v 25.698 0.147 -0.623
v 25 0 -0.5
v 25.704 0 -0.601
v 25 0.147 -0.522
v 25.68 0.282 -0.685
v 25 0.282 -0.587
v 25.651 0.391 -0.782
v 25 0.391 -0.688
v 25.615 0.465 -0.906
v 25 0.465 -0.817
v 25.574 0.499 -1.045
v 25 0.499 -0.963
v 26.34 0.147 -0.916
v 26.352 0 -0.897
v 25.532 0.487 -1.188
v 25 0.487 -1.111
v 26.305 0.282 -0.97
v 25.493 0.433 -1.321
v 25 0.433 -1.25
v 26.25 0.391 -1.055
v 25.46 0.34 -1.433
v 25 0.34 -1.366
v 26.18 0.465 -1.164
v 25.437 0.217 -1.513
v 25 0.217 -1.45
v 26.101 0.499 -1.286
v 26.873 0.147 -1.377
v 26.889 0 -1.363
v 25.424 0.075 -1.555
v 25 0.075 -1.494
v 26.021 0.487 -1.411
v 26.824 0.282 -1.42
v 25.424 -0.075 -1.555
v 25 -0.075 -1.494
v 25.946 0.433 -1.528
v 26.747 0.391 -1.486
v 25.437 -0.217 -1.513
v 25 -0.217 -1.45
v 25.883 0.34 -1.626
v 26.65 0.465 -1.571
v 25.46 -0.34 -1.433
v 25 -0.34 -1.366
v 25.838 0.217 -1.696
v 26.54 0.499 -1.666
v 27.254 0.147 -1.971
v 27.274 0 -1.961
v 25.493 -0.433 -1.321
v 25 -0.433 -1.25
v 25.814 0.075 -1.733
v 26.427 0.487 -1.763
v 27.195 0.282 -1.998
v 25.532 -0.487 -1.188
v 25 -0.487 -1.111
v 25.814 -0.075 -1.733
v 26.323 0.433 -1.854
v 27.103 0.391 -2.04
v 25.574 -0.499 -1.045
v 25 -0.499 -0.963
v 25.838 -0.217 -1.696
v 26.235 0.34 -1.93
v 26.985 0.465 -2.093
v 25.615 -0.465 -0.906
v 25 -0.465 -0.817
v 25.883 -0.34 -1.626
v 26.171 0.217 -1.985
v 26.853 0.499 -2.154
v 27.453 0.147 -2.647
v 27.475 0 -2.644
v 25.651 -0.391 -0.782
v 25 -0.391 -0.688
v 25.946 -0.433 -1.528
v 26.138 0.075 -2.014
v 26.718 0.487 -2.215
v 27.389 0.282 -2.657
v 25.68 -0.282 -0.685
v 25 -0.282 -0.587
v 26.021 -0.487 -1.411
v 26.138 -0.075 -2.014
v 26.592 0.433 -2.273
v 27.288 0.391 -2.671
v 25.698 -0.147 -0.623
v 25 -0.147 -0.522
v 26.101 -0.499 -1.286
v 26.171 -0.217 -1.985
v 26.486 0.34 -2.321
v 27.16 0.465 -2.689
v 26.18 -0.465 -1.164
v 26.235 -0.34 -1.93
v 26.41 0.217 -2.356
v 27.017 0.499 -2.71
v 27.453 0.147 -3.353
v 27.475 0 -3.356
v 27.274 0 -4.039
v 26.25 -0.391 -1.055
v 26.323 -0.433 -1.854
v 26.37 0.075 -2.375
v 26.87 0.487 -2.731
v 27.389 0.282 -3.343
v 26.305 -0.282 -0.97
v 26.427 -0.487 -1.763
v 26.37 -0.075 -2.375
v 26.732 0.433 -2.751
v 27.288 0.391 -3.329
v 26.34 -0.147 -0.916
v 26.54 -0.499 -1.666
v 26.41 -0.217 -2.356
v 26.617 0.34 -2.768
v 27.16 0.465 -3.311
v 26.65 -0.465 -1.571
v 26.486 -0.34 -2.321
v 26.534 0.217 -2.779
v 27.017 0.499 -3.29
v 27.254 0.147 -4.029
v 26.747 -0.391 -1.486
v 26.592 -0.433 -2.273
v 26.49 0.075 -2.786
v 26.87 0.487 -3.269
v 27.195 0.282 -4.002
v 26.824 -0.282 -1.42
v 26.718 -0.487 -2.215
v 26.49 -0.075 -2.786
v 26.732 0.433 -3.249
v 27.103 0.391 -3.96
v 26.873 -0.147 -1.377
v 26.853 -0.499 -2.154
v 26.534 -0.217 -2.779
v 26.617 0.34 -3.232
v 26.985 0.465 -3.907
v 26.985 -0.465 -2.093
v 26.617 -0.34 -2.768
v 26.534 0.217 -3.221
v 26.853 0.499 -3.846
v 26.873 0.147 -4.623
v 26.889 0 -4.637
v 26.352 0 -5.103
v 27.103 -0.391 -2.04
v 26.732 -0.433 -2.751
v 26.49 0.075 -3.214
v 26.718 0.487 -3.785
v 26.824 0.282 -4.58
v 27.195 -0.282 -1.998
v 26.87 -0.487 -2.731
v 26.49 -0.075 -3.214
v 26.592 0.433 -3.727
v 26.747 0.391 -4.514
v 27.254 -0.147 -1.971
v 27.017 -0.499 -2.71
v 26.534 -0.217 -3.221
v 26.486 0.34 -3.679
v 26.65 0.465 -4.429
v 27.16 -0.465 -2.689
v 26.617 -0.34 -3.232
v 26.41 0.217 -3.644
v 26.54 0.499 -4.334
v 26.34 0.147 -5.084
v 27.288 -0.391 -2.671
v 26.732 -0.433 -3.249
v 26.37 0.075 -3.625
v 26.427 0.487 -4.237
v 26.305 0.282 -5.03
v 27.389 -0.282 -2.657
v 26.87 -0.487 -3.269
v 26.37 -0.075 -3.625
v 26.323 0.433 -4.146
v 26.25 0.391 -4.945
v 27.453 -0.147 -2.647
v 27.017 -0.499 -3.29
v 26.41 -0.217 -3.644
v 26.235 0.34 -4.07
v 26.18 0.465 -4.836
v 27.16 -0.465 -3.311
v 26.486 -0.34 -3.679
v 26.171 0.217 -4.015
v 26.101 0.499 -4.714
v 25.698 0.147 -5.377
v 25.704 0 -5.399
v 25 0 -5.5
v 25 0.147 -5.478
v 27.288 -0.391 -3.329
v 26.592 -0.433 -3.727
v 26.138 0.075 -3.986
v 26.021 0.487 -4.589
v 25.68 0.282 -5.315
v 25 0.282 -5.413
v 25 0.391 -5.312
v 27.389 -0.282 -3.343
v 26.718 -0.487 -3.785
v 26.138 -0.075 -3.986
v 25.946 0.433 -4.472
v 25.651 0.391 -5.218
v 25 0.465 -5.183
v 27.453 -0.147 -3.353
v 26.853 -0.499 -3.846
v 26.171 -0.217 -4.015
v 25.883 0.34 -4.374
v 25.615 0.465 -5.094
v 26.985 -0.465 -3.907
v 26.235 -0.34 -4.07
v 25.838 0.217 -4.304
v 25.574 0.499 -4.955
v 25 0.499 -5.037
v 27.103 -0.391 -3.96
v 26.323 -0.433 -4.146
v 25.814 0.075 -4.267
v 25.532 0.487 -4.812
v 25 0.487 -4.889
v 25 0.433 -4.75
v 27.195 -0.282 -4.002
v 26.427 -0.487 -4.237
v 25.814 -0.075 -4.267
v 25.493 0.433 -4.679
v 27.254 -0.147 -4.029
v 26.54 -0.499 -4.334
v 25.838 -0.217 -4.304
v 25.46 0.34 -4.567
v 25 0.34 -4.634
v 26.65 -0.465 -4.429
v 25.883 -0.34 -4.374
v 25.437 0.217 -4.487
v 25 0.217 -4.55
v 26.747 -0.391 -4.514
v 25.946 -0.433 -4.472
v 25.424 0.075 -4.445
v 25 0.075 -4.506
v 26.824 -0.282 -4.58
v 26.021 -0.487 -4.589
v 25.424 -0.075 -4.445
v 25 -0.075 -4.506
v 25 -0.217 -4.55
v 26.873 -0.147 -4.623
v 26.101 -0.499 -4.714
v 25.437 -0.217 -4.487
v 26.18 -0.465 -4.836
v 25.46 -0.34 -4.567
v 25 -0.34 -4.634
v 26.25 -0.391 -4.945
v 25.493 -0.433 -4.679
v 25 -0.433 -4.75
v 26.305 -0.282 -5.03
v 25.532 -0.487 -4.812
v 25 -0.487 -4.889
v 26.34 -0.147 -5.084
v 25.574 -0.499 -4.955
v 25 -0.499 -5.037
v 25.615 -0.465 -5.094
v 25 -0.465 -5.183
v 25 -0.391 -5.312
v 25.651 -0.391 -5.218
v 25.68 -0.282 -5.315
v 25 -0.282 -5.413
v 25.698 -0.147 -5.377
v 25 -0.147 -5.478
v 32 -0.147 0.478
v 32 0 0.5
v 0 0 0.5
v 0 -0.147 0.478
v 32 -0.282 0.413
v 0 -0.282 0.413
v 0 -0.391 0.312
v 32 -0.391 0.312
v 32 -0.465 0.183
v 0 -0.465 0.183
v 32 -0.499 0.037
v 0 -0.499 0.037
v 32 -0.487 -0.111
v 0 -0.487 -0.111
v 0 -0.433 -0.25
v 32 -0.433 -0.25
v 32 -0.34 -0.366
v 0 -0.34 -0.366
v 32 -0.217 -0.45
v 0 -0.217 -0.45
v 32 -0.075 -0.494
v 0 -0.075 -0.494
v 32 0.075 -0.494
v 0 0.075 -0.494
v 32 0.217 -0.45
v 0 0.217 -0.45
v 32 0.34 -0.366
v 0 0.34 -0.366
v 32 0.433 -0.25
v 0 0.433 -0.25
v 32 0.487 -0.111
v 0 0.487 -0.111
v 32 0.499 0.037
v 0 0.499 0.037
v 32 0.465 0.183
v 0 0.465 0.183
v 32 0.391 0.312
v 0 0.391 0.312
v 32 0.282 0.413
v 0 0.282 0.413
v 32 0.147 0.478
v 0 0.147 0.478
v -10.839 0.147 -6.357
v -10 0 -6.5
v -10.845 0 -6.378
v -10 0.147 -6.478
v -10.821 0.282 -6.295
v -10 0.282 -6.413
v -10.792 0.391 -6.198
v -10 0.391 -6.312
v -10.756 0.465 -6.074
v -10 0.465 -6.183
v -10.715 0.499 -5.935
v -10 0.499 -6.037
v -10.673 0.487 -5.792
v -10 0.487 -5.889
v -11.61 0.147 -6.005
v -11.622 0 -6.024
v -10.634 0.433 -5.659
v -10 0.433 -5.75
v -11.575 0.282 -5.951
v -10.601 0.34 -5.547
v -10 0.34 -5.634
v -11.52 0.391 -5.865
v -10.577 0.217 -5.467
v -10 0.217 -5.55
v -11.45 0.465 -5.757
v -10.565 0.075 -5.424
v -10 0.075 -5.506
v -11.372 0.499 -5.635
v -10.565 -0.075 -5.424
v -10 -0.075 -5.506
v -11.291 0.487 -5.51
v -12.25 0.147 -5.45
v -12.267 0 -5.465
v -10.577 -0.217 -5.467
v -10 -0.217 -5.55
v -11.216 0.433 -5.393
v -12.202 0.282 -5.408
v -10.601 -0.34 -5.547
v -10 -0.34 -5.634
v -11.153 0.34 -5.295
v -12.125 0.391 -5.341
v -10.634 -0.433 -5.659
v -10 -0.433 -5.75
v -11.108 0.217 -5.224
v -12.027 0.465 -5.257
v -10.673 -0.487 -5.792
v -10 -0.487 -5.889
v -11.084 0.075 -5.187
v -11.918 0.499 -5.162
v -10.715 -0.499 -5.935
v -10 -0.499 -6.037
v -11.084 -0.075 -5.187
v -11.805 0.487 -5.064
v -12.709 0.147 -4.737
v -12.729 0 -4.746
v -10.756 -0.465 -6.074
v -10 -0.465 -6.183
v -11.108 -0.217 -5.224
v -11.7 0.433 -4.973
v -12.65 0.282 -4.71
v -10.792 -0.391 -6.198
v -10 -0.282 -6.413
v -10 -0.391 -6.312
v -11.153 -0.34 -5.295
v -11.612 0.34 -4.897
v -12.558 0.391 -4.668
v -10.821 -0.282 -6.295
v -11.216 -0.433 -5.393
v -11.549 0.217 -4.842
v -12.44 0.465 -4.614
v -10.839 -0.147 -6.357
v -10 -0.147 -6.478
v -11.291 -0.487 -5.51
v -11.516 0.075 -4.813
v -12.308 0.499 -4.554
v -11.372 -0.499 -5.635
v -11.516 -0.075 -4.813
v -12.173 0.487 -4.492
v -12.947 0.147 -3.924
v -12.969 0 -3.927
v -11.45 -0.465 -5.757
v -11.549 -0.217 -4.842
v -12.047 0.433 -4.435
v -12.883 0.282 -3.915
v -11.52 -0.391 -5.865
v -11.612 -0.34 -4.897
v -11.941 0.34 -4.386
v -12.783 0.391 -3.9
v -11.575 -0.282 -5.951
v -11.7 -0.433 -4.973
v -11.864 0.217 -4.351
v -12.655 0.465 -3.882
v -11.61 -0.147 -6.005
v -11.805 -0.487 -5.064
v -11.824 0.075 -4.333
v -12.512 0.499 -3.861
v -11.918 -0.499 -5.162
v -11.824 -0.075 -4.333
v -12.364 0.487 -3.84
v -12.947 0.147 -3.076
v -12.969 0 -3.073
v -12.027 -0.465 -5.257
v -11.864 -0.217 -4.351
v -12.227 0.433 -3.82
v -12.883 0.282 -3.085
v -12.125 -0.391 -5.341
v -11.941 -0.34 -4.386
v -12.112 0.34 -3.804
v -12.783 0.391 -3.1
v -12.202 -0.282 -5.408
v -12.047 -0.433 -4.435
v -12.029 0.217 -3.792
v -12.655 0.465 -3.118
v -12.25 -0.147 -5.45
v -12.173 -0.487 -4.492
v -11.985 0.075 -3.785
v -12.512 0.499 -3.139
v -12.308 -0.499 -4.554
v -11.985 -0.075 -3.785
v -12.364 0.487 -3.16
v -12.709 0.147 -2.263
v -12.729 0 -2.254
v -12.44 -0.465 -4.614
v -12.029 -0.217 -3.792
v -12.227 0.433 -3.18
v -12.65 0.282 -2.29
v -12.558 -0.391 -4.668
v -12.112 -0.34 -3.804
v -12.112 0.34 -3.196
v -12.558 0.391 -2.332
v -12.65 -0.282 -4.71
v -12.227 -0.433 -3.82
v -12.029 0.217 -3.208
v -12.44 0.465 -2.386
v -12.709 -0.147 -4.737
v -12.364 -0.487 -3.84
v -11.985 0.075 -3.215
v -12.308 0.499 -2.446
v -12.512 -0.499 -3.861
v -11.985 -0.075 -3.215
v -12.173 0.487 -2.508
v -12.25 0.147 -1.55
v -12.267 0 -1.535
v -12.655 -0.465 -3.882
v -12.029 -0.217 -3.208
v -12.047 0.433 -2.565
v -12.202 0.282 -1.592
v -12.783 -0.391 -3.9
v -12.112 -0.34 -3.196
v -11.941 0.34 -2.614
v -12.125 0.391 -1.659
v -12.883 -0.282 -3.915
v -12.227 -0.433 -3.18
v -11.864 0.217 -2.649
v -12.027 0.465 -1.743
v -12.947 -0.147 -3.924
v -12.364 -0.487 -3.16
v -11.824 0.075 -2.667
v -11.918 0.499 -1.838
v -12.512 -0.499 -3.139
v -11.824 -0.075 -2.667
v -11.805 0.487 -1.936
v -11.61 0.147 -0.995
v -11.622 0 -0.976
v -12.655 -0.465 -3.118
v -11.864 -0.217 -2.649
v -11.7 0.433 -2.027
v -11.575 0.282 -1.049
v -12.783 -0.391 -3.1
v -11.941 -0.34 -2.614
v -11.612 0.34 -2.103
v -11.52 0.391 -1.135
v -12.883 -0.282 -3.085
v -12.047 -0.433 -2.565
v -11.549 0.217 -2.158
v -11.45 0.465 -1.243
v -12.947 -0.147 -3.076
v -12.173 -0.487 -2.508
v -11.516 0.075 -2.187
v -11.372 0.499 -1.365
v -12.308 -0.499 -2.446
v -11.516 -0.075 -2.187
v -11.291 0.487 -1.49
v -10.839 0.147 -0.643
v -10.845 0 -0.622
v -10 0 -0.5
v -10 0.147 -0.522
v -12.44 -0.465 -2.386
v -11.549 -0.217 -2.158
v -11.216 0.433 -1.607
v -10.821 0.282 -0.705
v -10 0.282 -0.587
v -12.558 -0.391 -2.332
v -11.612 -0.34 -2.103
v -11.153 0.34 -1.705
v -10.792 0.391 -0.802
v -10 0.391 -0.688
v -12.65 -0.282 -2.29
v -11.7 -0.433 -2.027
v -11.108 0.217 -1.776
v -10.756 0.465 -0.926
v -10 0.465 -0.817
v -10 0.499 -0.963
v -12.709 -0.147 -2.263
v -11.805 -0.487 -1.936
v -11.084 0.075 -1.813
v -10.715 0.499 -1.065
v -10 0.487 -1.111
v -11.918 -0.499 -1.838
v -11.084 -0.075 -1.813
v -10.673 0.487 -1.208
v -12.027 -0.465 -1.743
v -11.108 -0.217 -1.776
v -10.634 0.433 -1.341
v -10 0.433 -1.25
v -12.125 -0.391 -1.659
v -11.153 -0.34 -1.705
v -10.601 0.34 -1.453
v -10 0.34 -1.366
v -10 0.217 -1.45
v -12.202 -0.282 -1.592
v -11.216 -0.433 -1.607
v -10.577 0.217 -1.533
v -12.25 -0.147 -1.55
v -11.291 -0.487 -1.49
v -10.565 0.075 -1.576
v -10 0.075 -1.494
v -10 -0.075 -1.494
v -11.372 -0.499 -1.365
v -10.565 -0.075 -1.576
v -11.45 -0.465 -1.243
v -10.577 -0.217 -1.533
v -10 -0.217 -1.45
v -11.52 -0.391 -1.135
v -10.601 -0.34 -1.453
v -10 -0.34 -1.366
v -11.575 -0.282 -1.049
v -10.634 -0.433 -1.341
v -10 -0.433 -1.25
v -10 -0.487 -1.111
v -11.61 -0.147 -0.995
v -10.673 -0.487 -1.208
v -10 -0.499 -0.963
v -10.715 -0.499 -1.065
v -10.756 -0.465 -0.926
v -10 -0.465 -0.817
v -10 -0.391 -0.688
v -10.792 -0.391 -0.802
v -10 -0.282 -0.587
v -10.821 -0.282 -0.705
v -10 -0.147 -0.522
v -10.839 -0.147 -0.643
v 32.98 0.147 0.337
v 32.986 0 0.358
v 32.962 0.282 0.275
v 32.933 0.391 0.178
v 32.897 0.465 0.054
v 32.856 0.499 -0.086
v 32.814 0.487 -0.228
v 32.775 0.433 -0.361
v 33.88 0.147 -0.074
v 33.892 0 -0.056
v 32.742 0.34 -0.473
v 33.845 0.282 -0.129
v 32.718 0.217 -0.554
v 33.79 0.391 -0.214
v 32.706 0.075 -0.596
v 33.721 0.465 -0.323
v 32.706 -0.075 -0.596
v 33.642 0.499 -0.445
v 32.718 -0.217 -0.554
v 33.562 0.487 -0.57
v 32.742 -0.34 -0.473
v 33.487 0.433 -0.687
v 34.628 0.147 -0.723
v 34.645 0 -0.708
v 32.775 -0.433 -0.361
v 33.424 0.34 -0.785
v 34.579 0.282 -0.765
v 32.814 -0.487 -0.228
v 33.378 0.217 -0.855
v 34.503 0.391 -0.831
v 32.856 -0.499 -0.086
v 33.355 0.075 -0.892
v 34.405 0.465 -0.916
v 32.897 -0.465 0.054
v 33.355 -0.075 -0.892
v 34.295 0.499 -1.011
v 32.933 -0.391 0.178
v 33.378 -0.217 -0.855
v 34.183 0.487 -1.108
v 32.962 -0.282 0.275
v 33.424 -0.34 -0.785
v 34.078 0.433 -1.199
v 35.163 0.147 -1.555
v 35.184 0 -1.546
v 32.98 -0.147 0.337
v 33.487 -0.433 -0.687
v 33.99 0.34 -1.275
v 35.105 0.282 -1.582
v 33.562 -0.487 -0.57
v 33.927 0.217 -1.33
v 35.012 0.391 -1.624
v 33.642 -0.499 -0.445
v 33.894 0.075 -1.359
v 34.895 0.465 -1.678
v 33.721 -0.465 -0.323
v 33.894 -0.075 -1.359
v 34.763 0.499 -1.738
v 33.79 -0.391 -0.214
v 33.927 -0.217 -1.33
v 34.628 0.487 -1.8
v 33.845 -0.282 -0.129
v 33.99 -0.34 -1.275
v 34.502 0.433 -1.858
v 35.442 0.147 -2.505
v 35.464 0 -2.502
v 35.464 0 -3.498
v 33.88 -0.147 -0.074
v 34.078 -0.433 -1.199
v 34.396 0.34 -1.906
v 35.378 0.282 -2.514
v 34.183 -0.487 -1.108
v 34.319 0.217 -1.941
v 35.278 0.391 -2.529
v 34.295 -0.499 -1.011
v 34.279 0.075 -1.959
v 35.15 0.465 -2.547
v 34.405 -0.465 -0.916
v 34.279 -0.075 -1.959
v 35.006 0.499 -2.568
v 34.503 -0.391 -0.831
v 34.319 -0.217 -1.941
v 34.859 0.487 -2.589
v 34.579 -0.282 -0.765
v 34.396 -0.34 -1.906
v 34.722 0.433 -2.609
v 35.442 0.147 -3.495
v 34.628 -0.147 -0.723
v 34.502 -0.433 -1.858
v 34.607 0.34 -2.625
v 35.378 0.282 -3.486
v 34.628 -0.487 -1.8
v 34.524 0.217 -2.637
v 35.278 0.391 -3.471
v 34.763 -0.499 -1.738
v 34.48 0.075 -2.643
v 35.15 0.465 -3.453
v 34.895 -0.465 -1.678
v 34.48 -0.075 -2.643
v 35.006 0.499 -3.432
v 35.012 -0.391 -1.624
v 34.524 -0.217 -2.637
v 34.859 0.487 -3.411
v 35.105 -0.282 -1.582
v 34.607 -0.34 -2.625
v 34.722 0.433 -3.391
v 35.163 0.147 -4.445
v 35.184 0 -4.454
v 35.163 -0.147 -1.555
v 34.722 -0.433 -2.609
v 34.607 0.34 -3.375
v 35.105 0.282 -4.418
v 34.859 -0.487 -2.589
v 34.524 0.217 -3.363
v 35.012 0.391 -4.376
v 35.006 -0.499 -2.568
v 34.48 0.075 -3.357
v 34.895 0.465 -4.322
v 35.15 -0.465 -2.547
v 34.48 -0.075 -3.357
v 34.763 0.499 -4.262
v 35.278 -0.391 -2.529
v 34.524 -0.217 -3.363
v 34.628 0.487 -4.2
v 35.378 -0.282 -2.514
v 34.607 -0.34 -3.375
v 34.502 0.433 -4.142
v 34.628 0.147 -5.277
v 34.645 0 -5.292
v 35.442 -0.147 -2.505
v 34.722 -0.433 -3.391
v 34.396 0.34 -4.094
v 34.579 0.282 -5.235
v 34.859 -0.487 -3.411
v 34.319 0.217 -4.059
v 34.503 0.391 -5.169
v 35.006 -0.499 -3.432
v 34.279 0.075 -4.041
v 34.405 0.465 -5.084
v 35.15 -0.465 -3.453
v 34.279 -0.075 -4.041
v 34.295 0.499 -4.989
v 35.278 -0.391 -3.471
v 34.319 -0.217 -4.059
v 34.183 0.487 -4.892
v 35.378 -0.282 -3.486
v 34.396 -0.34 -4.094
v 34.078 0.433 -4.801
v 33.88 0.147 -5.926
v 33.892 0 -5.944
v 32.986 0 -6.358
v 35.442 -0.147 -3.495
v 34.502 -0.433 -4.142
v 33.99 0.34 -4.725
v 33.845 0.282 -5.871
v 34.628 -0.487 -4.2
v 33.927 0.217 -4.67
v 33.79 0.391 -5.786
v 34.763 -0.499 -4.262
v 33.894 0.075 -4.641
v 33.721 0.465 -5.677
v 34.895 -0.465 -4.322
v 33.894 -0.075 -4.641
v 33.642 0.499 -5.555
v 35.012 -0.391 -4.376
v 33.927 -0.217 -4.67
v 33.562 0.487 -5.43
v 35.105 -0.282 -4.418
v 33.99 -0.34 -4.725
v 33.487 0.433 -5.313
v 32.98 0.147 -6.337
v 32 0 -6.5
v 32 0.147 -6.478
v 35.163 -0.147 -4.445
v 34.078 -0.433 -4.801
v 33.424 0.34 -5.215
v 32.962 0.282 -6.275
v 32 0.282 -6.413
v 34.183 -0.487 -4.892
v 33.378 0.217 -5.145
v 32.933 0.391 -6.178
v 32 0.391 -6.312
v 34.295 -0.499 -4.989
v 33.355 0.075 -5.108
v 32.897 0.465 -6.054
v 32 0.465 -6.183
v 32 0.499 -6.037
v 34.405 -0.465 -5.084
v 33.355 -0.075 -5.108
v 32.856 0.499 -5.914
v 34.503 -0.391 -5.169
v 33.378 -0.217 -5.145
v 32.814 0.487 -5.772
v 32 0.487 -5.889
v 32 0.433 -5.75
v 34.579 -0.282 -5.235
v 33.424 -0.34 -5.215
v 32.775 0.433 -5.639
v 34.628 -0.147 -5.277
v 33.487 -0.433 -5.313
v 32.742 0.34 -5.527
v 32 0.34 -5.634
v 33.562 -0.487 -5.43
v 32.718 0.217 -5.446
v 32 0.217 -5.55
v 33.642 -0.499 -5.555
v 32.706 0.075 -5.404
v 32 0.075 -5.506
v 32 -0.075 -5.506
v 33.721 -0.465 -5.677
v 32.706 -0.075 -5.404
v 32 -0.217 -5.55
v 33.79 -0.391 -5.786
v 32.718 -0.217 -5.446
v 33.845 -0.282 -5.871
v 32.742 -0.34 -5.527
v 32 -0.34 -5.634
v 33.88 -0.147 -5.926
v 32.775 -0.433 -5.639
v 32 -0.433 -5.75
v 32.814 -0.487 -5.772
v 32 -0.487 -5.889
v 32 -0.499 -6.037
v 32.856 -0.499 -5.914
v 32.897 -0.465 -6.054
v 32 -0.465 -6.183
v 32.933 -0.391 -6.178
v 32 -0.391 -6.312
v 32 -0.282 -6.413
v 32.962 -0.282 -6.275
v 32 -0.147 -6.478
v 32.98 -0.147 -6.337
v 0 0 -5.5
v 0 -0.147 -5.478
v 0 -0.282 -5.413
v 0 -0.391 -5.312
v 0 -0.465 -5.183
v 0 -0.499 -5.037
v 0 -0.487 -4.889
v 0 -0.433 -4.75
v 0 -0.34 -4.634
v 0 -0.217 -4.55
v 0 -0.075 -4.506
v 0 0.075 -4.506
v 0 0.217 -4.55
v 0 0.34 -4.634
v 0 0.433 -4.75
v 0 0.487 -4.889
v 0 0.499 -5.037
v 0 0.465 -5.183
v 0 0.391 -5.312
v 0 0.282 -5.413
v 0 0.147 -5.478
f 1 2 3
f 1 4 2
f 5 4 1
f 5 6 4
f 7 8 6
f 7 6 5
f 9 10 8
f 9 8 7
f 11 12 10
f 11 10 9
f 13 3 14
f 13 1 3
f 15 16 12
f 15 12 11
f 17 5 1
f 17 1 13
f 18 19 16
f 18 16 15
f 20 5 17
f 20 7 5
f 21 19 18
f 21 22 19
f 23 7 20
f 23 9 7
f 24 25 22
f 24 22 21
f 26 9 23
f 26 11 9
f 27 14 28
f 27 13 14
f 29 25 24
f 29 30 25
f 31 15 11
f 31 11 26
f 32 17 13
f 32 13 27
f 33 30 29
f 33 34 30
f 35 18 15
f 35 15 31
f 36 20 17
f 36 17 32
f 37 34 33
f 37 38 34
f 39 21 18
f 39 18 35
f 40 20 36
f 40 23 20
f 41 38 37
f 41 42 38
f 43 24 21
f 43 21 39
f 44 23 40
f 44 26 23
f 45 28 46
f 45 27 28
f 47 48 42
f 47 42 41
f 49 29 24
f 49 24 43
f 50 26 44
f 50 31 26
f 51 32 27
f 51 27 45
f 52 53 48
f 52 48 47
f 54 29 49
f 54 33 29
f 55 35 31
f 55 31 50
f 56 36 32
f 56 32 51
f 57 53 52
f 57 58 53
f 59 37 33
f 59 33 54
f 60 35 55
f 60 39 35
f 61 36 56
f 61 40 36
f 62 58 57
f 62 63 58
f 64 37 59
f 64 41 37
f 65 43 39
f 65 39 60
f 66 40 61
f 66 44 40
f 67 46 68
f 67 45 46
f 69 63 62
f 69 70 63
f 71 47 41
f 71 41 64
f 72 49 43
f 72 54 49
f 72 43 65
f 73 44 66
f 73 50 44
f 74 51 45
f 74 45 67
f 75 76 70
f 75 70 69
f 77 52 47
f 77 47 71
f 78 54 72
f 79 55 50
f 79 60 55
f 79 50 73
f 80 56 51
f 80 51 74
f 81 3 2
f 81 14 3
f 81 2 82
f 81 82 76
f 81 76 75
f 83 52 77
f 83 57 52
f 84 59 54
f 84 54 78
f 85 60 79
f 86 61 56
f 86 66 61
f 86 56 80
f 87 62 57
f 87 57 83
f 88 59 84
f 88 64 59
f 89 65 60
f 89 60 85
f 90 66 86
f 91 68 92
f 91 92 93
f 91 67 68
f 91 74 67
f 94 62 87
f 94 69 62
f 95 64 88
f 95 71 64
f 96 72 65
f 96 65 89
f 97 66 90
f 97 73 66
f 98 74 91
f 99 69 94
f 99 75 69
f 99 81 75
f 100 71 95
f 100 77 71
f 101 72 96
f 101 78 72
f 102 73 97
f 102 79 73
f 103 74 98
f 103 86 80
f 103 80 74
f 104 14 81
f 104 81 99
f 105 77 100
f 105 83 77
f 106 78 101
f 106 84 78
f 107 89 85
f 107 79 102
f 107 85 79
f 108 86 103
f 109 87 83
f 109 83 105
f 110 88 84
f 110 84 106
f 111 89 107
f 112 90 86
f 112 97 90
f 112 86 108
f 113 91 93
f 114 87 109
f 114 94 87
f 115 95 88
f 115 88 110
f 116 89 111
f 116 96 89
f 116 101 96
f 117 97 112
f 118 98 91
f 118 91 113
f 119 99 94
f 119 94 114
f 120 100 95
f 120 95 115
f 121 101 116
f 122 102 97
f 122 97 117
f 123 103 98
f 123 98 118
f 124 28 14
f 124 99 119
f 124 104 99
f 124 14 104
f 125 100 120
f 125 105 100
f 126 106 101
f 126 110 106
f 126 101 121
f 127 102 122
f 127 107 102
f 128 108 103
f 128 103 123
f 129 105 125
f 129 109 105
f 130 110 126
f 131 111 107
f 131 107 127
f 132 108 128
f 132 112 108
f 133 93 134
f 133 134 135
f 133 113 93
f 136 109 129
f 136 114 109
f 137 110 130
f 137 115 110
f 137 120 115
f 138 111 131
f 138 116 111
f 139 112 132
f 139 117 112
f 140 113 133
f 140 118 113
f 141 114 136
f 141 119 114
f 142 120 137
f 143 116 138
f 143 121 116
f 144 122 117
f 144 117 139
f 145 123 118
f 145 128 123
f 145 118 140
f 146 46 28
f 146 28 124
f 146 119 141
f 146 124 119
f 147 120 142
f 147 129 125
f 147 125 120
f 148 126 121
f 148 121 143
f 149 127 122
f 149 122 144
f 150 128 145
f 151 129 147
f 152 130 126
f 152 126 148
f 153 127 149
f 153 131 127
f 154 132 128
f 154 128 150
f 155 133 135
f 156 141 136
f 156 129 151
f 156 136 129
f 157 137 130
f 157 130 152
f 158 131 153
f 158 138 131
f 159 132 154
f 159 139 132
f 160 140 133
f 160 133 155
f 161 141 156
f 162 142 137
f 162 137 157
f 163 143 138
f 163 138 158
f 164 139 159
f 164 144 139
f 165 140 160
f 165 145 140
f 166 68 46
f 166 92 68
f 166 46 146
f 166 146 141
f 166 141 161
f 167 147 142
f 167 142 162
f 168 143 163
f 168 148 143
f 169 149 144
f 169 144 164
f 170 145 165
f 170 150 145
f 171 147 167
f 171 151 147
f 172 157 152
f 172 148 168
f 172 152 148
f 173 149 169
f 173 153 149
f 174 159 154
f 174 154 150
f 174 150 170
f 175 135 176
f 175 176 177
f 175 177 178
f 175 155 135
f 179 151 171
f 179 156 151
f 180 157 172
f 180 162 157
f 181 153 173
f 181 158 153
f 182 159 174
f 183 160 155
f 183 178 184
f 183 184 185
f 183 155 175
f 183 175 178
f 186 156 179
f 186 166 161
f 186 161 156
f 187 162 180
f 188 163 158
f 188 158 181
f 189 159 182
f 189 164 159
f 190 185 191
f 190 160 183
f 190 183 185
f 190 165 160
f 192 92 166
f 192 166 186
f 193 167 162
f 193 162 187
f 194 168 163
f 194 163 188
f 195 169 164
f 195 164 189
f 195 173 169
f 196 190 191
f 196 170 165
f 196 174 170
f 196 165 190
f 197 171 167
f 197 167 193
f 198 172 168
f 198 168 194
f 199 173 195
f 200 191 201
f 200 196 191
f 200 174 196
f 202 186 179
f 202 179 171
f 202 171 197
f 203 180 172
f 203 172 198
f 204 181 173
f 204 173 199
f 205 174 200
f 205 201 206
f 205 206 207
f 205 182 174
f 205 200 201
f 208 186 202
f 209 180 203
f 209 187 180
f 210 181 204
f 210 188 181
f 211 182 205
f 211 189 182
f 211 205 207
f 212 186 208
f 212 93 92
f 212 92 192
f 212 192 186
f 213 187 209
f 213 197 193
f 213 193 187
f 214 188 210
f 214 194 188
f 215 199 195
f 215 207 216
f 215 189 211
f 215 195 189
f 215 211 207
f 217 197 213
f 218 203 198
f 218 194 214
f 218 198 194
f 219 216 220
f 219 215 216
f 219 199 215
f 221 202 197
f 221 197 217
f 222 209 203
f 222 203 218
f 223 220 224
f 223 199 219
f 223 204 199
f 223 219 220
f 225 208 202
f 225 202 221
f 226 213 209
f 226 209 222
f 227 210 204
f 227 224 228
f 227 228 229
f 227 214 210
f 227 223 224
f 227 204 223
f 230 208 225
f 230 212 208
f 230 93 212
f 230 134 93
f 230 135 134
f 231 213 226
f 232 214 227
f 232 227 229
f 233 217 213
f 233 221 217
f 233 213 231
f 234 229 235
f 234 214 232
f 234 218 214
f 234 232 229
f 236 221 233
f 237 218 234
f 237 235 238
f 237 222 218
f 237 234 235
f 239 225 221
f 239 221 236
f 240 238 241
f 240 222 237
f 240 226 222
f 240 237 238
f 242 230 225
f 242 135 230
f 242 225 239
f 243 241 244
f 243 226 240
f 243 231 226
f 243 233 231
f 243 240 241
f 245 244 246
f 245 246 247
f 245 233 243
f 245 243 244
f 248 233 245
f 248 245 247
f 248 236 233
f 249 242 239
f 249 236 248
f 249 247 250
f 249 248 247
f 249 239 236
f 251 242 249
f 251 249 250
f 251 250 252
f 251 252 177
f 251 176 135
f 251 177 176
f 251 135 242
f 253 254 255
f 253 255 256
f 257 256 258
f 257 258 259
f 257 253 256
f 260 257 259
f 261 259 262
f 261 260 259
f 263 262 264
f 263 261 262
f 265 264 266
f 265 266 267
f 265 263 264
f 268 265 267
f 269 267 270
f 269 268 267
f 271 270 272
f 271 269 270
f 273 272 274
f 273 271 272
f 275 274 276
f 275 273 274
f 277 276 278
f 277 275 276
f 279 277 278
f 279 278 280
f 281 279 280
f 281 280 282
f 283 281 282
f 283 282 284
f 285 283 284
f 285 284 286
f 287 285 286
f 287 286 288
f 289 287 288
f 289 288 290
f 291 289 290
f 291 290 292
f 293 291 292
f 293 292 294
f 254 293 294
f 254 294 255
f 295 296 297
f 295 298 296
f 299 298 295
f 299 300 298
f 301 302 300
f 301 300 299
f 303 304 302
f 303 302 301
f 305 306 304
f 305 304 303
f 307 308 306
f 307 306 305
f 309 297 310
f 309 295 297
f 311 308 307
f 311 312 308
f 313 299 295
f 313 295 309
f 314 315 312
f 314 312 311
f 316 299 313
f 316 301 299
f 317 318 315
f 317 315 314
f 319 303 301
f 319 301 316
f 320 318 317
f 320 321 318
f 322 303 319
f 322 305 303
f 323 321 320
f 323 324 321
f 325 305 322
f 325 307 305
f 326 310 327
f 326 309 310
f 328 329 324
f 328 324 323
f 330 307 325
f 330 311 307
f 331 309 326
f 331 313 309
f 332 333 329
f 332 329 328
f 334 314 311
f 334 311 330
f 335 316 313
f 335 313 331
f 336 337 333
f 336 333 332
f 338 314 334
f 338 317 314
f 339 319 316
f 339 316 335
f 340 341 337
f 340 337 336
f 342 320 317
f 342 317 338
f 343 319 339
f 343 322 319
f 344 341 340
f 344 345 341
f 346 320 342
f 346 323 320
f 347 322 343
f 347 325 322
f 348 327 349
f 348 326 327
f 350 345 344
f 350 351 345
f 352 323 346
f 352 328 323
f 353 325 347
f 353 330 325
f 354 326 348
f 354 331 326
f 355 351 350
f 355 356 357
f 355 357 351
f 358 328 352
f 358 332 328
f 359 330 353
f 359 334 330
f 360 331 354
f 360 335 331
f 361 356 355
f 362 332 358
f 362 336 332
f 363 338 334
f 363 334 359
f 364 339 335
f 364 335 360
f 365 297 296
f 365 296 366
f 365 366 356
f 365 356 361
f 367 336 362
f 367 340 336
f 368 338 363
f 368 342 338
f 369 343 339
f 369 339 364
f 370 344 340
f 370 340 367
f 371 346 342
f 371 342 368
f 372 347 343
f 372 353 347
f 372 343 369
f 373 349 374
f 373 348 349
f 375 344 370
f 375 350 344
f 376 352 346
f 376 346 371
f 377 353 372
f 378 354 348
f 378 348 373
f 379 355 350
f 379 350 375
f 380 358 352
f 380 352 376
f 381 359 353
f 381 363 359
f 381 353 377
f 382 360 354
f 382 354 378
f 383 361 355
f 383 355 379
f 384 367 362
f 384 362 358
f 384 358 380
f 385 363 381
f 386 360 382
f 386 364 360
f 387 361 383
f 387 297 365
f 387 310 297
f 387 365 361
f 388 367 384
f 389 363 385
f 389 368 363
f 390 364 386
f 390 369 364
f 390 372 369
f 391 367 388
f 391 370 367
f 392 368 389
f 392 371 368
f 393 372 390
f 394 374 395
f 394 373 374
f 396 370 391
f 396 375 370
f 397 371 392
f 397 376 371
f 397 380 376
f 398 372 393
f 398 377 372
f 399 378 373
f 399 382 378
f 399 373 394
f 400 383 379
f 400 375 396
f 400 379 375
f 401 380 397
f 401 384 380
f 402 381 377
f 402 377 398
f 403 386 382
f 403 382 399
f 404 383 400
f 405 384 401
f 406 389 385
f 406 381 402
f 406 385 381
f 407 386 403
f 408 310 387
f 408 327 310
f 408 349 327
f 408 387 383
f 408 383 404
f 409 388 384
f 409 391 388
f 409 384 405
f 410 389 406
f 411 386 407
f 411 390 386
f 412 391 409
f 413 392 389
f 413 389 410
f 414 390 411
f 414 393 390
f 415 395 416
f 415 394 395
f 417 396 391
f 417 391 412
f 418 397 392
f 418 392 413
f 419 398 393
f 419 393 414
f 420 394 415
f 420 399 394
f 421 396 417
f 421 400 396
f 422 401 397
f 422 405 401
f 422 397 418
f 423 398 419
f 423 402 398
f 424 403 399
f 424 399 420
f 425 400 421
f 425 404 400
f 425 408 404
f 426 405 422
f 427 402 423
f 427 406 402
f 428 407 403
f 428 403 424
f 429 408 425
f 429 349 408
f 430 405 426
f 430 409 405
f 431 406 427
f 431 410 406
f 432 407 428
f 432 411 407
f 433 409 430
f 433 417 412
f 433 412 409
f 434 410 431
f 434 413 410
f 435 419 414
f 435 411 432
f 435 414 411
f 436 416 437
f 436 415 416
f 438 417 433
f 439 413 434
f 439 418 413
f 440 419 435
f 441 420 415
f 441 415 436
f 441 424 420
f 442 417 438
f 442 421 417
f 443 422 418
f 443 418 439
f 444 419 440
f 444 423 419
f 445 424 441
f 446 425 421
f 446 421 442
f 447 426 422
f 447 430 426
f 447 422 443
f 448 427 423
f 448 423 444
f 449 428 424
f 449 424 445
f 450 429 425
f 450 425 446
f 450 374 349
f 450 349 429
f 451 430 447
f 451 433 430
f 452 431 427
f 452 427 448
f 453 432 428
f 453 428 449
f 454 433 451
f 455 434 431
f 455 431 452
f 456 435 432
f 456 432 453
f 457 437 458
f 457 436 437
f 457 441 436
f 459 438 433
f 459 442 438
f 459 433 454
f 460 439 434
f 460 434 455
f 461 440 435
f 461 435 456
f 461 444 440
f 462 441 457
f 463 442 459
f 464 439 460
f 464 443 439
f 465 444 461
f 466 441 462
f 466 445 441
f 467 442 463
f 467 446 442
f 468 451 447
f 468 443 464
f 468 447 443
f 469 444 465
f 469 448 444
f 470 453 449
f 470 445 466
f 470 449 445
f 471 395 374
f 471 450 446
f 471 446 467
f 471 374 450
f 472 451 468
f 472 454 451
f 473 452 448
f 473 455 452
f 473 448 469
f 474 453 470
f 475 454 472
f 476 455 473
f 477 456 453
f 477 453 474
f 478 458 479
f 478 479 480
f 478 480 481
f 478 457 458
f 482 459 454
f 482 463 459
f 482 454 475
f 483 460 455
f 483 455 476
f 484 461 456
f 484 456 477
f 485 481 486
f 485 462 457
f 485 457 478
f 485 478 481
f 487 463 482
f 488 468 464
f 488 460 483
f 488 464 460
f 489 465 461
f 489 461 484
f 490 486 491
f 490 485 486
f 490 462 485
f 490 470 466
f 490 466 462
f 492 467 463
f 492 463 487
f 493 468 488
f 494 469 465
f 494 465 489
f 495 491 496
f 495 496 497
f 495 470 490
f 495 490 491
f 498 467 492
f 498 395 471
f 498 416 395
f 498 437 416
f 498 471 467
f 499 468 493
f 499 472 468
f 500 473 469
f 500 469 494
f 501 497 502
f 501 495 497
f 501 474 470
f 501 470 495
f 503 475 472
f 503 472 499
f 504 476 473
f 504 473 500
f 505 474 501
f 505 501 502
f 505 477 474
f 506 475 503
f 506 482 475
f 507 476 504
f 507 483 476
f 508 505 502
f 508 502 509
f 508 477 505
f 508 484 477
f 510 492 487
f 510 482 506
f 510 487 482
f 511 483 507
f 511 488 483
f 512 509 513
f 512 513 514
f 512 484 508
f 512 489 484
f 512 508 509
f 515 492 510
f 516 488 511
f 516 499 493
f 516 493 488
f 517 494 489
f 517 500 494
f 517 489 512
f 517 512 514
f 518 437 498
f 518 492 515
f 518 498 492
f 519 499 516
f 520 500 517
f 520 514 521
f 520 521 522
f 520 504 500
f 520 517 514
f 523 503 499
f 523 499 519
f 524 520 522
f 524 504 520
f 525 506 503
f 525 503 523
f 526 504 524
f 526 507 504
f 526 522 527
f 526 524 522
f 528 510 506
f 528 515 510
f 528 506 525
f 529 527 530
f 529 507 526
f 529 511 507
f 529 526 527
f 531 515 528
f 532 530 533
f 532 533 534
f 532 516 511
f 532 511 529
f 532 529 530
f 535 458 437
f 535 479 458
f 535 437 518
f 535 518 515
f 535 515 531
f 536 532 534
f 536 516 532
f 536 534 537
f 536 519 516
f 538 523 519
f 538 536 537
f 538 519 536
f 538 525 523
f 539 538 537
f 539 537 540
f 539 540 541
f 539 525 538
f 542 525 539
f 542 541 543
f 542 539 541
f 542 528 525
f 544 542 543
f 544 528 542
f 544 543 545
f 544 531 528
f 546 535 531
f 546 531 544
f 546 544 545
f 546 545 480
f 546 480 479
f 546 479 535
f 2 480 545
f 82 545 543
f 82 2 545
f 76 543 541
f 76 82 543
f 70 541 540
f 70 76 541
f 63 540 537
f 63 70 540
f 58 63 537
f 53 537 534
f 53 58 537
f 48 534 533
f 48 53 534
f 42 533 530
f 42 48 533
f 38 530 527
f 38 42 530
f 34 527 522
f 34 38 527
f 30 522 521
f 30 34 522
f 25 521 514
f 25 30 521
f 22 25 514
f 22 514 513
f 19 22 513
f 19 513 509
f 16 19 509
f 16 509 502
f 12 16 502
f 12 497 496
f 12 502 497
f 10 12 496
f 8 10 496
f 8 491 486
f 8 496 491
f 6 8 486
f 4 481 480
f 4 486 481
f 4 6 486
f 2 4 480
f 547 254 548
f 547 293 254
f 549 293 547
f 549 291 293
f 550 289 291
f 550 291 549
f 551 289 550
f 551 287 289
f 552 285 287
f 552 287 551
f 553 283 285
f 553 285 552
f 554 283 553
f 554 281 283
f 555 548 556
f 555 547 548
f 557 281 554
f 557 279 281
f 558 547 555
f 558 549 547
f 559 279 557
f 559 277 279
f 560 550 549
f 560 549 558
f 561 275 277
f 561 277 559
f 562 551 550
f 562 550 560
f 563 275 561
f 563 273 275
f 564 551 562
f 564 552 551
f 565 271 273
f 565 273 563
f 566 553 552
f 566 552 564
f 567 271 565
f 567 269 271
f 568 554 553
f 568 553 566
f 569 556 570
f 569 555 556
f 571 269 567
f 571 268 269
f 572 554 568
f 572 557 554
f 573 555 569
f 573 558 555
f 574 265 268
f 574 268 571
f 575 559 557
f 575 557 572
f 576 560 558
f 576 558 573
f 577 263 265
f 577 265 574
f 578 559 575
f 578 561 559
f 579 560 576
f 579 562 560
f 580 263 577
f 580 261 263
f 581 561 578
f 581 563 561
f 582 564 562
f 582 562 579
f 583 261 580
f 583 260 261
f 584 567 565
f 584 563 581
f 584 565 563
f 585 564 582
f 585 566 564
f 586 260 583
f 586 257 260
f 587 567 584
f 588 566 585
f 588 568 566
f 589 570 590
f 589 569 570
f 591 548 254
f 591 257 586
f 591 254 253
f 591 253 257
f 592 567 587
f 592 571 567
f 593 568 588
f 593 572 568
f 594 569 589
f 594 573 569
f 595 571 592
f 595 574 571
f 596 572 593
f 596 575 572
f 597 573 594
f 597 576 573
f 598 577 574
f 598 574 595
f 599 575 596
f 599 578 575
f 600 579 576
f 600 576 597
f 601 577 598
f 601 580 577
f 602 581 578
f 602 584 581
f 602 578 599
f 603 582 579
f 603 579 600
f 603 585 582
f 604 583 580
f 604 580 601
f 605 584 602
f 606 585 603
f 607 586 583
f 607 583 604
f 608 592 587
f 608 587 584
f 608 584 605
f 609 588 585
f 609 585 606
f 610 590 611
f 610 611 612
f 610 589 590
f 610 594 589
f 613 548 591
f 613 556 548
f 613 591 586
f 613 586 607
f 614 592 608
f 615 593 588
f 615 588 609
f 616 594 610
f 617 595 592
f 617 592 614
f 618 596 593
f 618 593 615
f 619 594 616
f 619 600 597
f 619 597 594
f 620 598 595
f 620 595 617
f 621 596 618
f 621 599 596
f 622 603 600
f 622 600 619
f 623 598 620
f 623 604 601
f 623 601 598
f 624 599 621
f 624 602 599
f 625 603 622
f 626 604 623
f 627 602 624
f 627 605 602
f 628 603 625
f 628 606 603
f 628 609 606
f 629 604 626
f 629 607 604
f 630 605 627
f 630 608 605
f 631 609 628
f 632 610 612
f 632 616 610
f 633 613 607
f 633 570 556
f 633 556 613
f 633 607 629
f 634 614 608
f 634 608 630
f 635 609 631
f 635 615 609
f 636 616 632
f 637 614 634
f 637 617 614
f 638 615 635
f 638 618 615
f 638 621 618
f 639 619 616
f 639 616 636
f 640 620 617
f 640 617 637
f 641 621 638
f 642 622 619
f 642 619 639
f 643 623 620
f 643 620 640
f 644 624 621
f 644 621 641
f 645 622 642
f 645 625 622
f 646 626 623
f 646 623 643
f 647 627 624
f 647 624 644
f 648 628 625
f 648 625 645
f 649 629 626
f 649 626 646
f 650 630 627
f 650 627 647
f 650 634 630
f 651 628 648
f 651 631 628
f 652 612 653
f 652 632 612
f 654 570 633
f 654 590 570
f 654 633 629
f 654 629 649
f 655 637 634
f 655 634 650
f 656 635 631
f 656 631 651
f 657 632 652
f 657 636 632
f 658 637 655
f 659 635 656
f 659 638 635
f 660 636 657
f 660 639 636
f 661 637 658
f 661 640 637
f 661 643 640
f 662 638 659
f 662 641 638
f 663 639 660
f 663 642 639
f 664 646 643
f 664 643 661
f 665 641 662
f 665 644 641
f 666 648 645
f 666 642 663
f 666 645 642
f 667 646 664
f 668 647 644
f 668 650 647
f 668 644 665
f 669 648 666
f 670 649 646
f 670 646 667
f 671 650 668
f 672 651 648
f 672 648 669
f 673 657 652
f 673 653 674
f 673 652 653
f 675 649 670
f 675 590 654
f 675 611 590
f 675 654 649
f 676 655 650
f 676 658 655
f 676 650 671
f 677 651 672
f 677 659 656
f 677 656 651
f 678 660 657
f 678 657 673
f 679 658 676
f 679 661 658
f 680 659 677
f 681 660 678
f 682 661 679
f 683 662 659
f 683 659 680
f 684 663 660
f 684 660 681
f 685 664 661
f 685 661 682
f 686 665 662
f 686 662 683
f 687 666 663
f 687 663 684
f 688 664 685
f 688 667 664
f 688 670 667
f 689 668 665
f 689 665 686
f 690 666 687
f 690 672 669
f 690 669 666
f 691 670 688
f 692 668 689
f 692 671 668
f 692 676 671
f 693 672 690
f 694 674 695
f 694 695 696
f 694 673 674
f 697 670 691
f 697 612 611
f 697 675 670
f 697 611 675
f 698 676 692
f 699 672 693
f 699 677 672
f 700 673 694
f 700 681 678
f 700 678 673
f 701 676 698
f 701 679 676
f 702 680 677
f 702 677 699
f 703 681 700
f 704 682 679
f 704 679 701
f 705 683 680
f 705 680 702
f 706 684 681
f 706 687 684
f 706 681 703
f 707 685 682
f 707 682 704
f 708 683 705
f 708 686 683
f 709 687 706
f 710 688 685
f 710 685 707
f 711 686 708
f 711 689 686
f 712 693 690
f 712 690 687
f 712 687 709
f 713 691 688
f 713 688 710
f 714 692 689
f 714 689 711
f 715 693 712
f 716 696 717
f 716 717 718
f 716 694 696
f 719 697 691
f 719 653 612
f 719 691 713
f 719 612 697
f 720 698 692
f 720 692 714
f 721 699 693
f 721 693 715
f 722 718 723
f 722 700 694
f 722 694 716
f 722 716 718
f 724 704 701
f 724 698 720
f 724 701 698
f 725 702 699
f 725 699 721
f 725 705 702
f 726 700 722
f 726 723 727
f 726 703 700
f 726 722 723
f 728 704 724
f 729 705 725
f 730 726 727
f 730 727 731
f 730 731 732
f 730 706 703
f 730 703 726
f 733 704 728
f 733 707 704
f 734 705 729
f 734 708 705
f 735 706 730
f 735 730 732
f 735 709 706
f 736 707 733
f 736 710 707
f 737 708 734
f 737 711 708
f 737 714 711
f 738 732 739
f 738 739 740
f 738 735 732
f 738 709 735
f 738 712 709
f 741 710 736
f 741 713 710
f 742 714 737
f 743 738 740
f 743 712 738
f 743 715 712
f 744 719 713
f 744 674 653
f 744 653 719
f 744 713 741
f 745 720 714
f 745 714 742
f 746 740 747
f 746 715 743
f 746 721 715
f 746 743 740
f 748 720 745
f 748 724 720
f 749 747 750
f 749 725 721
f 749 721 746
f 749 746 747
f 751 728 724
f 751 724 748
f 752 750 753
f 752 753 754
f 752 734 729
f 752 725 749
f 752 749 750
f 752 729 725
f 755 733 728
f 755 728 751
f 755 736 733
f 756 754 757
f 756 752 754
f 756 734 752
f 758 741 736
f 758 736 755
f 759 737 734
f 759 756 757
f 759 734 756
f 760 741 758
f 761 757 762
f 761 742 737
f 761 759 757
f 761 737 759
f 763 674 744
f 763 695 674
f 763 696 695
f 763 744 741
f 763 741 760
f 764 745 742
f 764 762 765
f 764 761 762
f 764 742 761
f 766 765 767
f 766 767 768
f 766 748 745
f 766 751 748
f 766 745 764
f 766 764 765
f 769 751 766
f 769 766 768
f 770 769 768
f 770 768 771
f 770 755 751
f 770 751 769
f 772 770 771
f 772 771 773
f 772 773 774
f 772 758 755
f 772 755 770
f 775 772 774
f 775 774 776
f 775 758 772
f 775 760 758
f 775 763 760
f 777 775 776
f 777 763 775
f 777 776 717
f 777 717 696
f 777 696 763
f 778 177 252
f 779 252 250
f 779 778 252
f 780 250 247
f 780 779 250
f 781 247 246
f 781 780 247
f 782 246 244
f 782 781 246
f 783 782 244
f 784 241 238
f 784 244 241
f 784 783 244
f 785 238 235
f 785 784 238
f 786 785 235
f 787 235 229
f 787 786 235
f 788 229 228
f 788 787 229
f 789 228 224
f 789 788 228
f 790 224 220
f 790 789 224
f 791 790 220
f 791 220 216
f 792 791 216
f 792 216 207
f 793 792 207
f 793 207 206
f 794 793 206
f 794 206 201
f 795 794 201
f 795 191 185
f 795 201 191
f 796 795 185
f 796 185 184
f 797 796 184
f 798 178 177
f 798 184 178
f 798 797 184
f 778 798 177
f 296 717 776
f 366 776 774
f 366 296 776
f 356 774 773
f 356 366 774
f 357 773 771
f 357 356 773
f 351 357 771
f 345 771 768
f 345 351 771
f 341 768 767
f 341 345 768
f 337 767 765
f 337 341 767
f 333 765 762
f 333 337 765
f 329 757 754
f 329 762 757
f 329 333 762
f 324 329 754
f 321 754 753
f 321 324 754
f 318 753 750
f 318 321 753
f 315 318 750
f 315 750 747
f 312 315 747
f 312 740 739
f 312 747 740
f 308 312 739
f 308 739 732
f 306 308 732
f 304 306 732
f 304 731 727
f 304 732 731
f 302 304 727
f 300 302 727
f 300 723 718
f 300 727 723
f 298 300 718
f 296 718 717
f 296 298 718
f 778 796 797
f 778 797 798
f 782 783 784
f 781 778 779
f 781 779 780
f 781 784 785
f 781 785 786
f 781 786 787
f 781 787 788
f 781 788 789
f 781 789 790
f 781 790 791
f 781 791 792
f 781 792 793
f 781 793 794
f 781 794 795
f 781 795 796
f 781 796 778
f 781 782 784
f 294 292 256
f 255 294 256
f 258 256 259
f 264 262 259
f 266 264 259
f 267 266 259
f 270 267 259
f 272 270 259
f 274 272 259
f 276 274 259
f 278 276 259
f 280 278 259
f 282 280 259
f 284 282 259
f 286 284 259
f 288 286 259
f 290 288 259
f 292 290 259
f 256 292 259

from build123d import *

# Parameters (mm, degrees)
SWEEP1_PROFILE_R = 0.49995


with BuildPart() as part:
    # Sweep1: sweep along a path in Sketch2
    with BuildLine(Plane(origin=(0, 0, 0), x_dir=(1, 0, 0), z_dir=(0, 1, 0))) as sweep1_path:
        Line((0, 0), (32, 0))
        ThreePointArc((32, 0), (35, 3), (32, 6))
        Line((32, 6), (-10, 6))
        ThreePointArc((-10, 6), (-12.5, 3.5), (-10, 1))
        Line((-10, 1), (25, 1))
        ThreePointArc((25, 1), (27, 3), (25, 5))
        Line((25, 5), (0, 5))
    # Sweep1 profile (on start of the path) → Sweep1 (sweep)
    with BuildSketch(Plane(origin=(0, 0, 0), x_dir=(0, 0, 1), z_dir=(1, 0, 0))):
        Circle(SWEEP1_PROFILE_R)
    sweep(path=sweep1_path.line)


solid = part.part
